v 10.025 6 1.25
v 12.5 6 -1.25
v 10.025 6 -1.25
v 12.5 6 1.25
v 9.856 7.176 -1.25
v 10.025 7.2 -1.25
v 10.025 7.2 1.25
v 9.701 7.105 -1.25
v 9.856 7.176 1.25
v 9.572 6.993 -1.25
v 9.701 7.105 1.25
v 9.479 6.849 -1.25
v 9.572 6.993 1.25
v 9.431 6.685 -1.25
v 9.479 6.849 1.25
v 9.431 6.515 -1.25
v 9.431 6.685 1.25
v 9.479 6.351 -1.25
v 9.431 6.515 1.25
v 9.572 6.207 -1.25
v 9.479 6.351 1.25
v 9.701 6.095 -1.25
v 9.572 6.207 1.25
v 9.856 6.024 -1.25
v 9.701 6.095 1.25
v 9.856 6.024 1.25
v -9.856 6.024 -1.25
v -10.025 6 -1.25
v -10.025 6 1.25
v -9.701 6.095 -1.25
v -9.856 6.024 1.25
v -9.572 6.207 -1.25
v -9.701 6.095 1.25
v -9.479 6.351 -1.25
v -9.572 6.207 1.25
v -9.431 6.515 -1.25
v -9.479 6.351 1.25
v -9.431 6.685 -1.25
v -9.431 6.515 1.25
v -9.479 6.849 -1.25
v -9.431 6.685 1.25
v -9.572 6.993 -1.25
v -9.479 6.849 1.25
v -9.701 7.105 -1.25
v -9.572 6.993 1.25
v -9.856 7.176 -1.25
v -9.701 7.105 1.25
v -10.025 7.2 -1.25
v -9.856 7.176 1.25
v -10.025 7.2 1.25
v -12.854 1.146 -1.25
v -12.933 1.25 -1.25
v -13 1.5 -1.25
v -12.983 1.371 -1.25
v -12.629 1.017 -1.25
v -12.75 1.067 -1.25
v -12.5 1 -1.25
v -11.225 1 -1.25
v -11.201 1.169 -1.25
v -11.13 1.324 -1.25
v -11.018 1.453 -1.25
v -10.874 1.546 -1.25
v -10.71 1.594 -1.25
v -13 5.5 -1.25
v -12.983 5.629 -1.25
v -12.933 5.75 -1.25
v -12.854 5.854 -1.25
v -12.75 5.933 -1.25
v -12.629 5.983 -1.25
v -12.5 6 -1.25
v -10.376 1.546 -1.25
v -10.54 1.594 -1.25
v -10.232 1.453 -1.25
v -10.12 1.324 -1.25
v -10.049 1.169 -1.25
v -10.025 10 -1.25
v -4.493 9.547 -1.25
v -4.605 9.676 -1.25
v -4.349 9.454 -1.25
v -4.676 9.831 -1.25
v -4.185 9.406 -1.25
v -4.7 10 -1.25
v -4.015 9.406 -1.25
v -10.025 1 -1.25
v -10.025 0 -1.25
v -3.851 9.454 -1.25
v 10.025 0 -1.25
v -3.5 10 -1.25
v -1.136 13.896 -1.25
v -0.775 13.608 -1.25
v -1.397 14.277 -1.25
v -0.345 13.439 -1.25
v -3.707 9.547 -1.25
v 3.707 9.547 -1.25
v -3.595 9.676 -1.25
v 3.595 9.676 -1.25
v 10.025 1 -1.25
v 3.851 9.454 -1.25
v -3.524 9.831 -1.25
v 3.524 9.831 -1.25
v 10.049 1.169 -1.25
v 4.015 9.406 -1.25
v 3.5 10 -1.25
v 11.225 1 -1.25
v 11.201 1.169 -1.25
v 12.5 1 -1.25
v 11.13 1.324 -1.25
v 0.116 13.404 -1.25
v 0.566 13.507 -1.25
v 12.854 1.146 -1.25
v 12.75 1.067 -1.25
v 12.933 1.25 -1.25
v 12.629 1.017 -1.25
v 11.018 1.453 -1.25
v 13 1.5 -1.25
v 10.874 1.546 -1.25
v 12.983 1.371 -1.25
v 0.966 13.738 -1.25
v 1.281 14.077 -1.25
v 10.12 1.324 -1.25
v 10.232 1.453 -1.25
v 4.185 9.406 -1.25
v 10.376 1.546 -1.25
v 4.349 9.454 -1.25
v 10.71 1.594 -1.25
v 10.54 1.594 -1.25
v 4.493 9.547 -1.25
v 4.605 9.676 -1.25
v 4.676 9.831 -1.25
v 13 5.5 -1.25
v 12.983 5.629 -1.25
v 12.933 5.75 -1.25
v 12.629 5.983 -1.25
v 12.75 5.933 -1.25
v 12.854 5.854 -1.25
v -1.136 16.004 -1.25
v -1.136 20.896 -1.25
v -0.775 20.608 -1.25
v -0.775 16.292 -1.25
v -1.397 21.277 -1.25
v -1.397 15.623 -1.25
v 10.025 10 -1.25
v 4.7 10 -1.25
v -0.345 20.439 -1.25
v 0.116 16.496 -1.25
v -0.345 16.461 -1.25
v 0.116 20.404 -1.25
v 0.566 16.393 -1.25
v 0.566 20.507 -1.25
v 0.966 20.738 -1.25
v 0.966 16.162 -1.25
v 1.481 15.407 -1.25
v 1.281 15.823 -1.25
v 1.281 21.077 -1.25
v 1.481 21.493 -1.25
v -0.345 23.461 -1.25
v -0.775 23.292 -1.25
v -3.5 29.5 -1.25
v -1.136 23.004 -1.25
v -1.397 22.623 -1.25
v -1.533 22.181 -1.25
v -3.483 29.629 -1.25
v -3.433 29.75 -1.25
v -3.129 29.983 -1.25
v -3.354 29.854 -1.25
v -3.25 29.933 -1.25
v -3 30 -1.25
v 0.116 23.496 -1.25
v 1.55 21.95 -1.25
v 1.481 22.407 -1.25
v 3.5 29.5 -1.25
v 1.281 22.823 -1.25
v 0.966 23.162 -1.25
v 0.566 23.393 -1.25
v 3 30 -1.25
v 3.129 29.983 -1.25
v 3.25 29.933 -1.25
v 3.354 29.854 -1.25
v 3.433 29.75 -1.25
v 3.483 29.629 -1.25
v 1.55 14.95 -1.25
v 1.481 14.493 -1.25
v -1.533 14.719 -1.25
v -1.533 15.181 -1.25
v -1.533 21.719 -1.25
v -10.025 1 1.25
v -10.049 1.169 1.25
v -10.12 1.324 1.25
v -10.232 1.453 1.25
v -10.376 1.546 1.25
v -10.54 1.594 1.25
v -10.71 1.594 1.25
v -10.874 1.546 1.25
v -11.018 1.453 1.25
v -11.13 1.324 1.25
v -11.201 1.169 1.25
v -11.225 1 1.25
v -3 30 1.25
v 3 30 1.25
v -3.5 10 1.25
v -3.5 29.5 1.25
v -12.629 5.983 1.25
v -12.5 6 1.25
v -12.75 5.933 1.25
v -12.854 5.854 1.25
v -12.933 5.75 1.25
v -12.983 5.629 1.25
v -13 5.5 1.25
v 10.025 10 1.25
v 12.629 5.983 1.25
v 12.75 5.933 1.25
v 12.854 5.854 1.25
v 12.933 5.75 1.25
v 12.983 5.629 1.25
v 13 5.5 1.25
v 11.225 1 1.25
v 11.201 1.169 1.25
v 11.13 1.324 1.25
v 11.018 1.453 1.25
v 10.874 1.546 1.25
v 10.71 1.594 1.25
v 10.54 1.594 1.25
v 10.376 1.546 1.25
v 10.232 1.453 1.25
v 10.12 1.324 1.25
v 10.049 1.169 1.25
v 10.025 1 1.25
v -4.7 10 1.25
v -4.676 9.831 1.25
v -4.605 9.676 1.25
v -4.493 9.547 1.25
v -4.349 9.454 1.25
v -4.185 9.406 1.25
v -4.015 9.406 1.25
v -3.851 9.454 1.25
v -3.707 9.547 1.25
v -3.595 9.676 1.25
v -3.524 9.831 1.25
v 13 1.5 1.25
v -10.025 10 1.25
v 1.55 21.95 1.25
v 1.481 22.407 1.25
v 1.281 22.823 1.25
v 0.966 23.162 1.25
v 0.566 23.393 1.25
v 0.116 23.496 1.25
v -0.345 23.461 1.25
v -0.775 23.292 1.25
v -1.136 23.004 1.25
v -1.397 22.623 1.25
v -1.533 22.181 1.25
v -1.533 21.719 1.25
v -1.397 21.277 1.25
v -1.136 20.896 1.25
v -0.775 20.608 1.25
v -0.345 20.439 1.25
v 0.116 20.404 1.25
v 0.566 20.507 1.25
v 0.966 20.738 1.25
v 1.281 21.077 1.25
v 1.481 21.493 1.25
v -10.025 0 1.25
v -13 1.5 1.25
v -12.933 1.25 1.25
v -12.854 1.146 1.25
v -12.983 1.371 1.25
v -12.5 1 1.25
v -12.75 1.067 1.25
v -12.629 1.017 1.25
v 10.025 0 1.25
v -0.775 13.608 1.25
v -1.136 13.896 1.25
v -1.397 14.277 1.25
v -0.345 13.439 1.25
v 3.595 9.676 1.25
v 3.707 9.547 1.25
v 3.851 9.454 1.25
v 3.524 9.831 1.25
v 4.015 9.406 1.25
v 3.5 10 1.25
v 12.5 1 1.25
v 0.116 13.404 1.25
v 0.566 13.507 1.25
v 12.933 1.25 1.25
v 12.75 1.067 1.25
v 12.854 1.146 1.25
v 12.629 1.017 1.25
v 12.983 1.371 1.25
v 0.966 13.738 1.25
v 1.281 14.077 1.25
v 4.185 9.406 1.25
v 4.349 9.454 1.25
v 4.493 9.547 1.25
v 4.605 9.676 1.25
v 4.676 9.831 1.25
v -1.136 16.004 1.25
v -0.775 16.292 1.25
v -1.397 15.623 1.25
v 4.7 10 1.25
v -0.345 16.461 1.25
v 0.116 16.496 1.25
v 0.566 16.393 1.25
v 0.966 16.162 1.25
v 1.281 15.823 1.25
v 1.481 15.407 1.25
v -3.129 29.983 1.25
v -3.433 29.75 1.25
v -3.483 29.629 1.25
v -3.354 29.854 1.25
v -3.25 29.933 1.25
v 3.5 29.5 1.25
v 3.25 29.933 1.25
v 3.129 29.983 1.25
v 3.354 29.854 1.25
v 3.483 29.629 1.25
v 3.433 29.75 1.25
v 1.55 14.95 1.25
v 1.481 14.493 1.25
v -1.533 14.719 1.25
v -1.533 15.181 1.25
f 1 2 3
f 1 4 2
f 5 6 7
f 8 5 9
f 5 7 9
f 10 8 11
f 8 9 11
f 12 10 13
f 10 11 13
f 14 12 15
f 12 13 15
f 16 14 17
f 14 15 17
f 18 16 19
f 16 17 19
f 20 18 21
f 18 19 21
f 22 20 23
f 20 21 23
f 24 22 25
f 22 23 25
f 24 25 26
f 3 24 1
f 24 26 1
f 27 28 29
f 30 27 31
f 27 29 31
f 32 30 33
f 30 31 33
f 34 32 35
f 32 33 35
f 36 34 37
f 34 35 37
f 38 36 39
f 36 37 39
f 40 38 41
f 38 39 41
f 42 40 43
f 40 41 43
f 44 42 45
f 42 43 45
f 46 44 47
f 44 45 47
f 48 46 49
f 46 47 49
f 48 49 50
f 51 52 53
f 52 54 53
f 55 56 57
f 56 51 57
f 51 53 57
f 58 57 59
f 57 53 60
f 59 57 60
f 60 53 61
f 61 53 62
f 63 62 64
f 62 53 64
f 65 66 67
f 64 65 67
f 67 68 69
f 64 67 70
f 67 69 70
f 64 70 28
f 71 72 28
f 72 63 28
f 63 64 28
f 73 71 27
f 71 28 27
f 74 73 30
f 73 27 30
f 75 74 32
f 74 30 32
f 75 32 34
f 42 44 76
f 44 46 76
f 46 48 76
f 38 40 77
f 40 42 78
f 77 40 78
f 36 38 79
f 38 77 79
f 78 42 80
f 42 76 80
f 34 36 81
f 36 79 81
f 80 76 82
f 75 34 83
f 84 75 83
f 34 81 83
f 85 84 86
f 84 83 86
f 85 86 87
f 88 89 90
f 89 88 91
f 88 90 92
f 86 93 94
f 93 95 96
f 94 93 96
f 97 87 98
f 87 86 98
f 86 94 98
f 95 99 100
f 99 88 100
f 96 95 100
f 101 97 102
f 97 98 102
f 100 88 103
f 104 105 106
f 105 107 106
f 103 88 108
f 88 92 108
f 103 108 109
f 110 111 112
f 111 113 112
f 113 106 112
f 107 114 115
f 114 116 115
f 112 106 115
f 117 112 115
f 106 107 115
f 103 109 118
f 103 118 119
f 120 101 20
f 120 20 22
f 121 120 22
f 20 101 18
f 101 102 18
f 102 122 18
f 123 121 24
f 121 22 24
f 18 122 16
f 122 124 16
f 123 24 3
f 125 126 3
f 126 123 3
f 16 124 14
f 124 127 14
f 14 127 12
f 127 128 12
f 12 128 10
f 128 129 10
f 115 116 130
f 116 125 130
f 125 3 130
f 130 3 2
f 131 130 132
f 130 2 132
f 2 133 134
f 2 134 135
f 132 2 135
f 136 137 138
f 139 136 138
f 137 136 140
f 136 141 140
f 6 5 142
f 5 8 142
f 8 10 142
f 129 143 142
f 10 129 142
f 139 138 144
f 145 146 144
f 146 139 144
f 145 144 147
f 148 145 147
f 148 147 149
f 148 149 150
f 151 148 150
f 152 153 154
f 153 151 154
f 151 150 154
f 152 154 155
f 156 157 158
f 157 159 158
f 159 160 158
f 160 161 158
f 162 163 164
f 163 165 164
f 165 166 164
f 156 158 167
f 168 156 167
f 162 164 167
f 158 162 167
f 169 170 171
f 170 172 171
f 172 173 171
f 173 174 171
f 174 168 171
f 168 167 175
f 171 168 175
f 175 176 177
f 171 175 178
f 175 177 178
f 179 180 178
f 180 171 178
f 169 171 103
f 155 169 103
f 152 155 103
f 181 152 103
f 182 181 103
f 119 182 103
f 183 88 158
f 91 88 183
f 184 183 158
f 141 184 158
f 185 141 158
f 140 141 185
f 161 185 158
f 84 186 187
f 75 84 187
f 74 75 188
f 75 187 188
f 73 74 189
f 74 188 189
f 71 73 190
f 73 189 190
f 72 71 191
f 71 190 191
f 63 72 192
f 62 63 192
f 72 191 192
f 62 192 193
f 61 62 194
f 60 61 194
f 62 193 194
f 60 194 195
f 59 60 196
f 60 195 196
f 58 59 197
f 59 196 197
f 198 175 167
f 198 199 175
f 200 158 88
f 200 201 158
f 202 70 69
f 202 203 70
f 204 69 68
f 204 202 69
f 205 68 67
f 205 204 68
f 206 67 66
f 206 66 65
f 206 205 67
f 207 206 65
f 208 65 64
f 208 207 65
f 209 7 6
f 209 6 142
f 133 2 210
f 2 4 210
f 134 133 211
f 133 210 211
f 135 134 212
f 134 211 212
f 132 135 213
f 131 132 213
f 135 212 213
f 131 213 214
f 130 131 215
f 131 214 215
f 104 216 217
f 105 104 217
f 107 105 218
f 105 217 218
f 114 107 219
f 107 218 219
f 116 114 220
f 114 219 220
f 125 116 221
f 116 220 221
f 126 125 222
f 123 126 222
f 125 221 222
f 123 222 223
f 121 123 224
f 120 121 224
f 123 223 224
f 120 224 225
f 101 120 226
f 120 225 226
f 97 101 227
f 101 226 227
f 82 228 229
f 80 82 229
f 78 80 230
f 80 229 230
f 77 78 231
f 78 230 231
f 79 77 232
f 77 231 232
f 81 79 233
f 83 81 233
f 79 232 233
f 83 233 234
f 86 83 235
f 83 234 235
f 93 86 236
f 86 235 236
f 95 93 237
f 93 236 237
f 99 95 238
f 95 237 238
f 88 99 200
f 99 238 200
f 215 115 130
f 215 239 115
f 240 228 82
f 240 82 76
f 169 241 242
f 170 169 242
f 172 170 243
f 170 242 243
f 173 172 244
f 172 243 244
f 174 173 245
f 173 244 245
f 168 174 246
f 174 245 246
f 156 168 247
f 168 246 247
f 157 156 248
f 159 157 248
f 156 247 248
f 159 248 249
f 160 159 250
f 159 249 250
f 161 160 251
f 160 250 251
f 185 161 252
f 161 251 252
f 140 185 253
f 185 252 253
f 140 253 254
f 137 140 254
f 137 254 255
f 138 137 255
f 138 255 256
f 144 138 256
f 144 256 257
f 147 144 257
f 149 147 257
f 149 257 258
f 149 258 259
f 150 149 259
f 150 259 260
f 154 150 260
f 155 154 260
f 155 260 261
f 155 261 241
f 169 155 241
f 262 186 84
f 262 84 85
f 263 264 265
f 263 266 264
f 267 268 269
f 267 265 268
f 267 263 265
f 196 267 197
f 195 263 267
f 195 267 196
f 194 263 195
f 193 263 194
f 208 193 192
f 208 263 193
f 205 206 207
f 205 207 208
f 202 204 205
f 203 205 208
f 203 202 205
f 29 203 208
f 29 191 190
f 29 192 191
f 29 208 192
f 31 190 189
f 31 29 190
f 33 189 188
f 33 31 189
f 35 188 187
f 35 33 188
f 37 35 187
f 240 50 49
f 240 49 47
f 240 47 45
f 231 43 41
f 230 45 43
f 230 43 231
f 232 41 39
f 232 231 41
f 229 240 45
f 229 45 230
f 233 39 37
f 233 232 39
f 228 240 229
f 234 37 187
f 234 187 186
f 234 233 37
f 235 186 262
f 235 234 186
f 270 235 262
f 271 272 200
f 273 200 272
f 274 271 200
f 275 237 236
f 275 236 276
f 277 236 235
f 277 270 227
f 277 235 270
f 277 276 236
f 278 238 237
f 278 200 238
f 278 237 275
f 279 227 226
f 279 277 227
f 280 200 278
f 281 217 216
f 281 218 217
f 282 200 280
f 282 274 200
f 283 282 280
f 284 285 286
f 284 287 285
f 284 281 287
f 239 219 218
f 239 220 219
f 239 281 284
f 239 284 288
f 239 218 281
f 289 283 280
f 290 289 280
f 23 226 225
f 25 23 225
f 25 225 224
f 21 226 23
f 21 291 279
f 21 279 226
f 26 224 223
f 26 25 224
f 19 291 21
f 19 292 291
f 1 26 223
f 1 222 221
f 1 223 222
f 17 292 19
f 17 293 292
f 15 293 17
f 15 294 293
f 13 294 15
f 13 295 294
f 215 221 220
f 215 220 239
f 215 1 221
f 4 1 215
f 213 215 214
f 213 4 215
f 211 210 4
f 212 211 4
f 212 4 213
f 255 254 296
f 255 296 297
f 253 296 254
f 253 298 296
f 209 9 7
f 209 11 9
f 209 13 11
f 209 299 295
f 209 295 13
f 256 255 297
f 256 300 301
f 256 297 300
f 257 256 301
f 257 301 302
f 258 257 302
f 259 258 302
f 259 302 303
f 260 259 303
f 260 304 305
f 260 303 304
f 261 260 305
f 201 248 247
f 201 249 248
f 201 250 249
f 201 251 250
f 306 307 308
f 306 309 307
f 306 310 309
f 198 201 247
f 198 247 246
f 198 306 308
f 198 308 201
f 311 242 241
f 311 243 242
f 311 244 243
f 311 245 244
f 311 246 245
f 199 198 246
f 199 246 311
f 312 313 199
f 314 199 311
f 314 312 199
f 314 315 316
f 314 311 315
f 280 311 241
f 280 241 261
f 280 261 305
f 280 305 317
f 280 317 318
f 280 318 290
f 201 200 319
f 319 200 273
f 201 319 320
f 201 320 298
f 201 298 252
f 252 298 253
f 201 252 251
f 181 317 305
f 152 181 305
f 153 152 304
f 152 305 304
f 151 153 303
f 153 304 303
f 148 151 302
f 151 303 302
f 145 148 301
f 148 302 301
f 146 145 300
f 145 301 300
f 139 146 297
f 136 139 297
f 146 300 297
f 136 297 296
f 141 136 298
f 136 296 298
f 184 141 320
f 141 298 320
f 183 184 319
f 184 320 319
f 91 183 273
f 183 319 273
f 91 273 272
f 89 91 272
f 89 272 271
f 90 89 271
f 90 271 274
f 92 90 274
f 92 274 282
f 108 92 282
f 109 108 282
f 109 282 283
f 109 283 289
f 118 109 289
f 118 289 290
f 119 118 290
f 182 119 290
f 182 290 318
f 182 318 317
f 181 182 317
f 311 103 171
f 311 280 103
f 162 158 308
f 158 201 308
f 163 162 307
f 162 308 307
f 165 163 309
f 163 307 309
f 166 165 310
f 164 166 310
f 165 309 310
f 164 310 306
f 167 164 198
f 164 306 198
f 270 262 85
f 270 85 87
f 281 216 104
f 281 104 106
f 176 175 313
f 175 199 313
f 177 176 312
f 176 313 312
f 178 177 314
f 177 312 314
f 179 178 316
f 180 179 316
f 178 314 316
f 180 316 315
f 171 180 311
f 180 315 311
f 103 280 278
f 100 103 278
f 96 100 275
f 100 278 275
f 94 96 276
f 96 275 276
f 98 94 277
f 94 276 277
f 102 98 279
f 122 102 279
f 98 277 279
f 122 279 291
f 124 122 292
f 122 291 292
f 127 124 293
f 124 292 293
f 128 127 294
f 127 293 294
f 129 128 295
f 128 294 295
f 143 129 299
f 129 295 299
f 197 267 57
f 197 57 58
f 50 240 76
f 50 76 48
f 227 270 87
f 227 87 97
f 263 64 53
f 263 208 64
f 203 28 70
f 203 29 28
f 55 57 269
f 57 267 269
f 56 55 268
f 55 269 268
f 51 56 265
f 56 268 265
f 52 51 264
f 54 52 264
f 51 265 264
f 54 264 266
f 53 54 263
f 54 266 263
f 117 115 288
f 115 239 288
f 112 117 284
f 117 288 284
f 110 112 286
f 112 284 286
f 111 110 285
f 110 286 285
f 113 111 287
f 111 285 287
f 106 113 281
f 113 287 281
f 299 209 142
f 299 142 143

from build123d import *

# Parameters (mm, degrees)
EXTRUDE_1_DEPTH     = 1.25
SKETCH_2_R          = 0.6
CUT_EXTRUDE_1_DEPTH = 3.5
FILLET_1_R          = 0.5
SKETCH_3_R          = 1.55
CUT_EXTRUDE_2_DEPTH = 3.5


with BuildPart() as part:
    # 草图1 → 凸台-拉伸1 (new body, symmetric)
    with BuildSketch(Plane.XY):
        Polygon((-10.025, 6), (-13, 6), (-13, 1), (-10.025, 1), (-10.025, 0), (10.025, 0), (10.025, 1), (13, 1), (13, 6), (10.025, 6), (10.025, 10), (3.5, 10), (3.5, 30), (-3.5, 30), (-3.5, 10), (-10.025, 10), align=None)
    extrude(amount=EXTRUDE_1_DEPTH, both=True)

    # 草图2 → 切除-拉伸1 (cut, through all)
    with BuildSketch(Plane.XY.offset(1.25)):
        with Locations((-10.025, 6.6)):
            Circle(SKETCH_2_R)
        with Locations((-10.625, 1)):
            Circle(SKETCH_2_R)
        with Locations((10.025, 6.6)):
            Circle(SKETCH_2_R)
        with Locations((10.625, 1)):
            Circle(SKETCH_2_R)
        with Locations((-4.1, 10)):
            Circle(SKETCH_2_R)
        with Locations((4.1, 10)):
            Circle(SKETCH_2_R)
    extrude(amount=-CUT_EXTRUDE_1_DEPTH, mode=Mode.SUBTRACT)

    # 圆角1
    fillet_1_edges = [part.edges().sort_by_distance(p)[0] for p in [
        (-3.5, 30, 0),
        (3.5, 30, 0),
        (13, 6, 0),
        (13, 1, 0),
        (-13, 1, 0),
        (-13, 6, 0),
    ]]
    fillet(fillet_1_edges, radius=FILLET_1_R)

    # 草图3 → 切除-拉伸2 (cut, through all)
    with BuildSketch(Plane.XY.offset(1.25)):
        with Locations((0, 14.95)):
            Circle(SKETCH_3_R)
        with Locations((0, 21.95)):
            Circle(SKETCH_3_R)
    extrude(amount=-CUT_EXTRUDE_2_DEPTH, mode=Mode.SUBTRACT)


solid = part.part
